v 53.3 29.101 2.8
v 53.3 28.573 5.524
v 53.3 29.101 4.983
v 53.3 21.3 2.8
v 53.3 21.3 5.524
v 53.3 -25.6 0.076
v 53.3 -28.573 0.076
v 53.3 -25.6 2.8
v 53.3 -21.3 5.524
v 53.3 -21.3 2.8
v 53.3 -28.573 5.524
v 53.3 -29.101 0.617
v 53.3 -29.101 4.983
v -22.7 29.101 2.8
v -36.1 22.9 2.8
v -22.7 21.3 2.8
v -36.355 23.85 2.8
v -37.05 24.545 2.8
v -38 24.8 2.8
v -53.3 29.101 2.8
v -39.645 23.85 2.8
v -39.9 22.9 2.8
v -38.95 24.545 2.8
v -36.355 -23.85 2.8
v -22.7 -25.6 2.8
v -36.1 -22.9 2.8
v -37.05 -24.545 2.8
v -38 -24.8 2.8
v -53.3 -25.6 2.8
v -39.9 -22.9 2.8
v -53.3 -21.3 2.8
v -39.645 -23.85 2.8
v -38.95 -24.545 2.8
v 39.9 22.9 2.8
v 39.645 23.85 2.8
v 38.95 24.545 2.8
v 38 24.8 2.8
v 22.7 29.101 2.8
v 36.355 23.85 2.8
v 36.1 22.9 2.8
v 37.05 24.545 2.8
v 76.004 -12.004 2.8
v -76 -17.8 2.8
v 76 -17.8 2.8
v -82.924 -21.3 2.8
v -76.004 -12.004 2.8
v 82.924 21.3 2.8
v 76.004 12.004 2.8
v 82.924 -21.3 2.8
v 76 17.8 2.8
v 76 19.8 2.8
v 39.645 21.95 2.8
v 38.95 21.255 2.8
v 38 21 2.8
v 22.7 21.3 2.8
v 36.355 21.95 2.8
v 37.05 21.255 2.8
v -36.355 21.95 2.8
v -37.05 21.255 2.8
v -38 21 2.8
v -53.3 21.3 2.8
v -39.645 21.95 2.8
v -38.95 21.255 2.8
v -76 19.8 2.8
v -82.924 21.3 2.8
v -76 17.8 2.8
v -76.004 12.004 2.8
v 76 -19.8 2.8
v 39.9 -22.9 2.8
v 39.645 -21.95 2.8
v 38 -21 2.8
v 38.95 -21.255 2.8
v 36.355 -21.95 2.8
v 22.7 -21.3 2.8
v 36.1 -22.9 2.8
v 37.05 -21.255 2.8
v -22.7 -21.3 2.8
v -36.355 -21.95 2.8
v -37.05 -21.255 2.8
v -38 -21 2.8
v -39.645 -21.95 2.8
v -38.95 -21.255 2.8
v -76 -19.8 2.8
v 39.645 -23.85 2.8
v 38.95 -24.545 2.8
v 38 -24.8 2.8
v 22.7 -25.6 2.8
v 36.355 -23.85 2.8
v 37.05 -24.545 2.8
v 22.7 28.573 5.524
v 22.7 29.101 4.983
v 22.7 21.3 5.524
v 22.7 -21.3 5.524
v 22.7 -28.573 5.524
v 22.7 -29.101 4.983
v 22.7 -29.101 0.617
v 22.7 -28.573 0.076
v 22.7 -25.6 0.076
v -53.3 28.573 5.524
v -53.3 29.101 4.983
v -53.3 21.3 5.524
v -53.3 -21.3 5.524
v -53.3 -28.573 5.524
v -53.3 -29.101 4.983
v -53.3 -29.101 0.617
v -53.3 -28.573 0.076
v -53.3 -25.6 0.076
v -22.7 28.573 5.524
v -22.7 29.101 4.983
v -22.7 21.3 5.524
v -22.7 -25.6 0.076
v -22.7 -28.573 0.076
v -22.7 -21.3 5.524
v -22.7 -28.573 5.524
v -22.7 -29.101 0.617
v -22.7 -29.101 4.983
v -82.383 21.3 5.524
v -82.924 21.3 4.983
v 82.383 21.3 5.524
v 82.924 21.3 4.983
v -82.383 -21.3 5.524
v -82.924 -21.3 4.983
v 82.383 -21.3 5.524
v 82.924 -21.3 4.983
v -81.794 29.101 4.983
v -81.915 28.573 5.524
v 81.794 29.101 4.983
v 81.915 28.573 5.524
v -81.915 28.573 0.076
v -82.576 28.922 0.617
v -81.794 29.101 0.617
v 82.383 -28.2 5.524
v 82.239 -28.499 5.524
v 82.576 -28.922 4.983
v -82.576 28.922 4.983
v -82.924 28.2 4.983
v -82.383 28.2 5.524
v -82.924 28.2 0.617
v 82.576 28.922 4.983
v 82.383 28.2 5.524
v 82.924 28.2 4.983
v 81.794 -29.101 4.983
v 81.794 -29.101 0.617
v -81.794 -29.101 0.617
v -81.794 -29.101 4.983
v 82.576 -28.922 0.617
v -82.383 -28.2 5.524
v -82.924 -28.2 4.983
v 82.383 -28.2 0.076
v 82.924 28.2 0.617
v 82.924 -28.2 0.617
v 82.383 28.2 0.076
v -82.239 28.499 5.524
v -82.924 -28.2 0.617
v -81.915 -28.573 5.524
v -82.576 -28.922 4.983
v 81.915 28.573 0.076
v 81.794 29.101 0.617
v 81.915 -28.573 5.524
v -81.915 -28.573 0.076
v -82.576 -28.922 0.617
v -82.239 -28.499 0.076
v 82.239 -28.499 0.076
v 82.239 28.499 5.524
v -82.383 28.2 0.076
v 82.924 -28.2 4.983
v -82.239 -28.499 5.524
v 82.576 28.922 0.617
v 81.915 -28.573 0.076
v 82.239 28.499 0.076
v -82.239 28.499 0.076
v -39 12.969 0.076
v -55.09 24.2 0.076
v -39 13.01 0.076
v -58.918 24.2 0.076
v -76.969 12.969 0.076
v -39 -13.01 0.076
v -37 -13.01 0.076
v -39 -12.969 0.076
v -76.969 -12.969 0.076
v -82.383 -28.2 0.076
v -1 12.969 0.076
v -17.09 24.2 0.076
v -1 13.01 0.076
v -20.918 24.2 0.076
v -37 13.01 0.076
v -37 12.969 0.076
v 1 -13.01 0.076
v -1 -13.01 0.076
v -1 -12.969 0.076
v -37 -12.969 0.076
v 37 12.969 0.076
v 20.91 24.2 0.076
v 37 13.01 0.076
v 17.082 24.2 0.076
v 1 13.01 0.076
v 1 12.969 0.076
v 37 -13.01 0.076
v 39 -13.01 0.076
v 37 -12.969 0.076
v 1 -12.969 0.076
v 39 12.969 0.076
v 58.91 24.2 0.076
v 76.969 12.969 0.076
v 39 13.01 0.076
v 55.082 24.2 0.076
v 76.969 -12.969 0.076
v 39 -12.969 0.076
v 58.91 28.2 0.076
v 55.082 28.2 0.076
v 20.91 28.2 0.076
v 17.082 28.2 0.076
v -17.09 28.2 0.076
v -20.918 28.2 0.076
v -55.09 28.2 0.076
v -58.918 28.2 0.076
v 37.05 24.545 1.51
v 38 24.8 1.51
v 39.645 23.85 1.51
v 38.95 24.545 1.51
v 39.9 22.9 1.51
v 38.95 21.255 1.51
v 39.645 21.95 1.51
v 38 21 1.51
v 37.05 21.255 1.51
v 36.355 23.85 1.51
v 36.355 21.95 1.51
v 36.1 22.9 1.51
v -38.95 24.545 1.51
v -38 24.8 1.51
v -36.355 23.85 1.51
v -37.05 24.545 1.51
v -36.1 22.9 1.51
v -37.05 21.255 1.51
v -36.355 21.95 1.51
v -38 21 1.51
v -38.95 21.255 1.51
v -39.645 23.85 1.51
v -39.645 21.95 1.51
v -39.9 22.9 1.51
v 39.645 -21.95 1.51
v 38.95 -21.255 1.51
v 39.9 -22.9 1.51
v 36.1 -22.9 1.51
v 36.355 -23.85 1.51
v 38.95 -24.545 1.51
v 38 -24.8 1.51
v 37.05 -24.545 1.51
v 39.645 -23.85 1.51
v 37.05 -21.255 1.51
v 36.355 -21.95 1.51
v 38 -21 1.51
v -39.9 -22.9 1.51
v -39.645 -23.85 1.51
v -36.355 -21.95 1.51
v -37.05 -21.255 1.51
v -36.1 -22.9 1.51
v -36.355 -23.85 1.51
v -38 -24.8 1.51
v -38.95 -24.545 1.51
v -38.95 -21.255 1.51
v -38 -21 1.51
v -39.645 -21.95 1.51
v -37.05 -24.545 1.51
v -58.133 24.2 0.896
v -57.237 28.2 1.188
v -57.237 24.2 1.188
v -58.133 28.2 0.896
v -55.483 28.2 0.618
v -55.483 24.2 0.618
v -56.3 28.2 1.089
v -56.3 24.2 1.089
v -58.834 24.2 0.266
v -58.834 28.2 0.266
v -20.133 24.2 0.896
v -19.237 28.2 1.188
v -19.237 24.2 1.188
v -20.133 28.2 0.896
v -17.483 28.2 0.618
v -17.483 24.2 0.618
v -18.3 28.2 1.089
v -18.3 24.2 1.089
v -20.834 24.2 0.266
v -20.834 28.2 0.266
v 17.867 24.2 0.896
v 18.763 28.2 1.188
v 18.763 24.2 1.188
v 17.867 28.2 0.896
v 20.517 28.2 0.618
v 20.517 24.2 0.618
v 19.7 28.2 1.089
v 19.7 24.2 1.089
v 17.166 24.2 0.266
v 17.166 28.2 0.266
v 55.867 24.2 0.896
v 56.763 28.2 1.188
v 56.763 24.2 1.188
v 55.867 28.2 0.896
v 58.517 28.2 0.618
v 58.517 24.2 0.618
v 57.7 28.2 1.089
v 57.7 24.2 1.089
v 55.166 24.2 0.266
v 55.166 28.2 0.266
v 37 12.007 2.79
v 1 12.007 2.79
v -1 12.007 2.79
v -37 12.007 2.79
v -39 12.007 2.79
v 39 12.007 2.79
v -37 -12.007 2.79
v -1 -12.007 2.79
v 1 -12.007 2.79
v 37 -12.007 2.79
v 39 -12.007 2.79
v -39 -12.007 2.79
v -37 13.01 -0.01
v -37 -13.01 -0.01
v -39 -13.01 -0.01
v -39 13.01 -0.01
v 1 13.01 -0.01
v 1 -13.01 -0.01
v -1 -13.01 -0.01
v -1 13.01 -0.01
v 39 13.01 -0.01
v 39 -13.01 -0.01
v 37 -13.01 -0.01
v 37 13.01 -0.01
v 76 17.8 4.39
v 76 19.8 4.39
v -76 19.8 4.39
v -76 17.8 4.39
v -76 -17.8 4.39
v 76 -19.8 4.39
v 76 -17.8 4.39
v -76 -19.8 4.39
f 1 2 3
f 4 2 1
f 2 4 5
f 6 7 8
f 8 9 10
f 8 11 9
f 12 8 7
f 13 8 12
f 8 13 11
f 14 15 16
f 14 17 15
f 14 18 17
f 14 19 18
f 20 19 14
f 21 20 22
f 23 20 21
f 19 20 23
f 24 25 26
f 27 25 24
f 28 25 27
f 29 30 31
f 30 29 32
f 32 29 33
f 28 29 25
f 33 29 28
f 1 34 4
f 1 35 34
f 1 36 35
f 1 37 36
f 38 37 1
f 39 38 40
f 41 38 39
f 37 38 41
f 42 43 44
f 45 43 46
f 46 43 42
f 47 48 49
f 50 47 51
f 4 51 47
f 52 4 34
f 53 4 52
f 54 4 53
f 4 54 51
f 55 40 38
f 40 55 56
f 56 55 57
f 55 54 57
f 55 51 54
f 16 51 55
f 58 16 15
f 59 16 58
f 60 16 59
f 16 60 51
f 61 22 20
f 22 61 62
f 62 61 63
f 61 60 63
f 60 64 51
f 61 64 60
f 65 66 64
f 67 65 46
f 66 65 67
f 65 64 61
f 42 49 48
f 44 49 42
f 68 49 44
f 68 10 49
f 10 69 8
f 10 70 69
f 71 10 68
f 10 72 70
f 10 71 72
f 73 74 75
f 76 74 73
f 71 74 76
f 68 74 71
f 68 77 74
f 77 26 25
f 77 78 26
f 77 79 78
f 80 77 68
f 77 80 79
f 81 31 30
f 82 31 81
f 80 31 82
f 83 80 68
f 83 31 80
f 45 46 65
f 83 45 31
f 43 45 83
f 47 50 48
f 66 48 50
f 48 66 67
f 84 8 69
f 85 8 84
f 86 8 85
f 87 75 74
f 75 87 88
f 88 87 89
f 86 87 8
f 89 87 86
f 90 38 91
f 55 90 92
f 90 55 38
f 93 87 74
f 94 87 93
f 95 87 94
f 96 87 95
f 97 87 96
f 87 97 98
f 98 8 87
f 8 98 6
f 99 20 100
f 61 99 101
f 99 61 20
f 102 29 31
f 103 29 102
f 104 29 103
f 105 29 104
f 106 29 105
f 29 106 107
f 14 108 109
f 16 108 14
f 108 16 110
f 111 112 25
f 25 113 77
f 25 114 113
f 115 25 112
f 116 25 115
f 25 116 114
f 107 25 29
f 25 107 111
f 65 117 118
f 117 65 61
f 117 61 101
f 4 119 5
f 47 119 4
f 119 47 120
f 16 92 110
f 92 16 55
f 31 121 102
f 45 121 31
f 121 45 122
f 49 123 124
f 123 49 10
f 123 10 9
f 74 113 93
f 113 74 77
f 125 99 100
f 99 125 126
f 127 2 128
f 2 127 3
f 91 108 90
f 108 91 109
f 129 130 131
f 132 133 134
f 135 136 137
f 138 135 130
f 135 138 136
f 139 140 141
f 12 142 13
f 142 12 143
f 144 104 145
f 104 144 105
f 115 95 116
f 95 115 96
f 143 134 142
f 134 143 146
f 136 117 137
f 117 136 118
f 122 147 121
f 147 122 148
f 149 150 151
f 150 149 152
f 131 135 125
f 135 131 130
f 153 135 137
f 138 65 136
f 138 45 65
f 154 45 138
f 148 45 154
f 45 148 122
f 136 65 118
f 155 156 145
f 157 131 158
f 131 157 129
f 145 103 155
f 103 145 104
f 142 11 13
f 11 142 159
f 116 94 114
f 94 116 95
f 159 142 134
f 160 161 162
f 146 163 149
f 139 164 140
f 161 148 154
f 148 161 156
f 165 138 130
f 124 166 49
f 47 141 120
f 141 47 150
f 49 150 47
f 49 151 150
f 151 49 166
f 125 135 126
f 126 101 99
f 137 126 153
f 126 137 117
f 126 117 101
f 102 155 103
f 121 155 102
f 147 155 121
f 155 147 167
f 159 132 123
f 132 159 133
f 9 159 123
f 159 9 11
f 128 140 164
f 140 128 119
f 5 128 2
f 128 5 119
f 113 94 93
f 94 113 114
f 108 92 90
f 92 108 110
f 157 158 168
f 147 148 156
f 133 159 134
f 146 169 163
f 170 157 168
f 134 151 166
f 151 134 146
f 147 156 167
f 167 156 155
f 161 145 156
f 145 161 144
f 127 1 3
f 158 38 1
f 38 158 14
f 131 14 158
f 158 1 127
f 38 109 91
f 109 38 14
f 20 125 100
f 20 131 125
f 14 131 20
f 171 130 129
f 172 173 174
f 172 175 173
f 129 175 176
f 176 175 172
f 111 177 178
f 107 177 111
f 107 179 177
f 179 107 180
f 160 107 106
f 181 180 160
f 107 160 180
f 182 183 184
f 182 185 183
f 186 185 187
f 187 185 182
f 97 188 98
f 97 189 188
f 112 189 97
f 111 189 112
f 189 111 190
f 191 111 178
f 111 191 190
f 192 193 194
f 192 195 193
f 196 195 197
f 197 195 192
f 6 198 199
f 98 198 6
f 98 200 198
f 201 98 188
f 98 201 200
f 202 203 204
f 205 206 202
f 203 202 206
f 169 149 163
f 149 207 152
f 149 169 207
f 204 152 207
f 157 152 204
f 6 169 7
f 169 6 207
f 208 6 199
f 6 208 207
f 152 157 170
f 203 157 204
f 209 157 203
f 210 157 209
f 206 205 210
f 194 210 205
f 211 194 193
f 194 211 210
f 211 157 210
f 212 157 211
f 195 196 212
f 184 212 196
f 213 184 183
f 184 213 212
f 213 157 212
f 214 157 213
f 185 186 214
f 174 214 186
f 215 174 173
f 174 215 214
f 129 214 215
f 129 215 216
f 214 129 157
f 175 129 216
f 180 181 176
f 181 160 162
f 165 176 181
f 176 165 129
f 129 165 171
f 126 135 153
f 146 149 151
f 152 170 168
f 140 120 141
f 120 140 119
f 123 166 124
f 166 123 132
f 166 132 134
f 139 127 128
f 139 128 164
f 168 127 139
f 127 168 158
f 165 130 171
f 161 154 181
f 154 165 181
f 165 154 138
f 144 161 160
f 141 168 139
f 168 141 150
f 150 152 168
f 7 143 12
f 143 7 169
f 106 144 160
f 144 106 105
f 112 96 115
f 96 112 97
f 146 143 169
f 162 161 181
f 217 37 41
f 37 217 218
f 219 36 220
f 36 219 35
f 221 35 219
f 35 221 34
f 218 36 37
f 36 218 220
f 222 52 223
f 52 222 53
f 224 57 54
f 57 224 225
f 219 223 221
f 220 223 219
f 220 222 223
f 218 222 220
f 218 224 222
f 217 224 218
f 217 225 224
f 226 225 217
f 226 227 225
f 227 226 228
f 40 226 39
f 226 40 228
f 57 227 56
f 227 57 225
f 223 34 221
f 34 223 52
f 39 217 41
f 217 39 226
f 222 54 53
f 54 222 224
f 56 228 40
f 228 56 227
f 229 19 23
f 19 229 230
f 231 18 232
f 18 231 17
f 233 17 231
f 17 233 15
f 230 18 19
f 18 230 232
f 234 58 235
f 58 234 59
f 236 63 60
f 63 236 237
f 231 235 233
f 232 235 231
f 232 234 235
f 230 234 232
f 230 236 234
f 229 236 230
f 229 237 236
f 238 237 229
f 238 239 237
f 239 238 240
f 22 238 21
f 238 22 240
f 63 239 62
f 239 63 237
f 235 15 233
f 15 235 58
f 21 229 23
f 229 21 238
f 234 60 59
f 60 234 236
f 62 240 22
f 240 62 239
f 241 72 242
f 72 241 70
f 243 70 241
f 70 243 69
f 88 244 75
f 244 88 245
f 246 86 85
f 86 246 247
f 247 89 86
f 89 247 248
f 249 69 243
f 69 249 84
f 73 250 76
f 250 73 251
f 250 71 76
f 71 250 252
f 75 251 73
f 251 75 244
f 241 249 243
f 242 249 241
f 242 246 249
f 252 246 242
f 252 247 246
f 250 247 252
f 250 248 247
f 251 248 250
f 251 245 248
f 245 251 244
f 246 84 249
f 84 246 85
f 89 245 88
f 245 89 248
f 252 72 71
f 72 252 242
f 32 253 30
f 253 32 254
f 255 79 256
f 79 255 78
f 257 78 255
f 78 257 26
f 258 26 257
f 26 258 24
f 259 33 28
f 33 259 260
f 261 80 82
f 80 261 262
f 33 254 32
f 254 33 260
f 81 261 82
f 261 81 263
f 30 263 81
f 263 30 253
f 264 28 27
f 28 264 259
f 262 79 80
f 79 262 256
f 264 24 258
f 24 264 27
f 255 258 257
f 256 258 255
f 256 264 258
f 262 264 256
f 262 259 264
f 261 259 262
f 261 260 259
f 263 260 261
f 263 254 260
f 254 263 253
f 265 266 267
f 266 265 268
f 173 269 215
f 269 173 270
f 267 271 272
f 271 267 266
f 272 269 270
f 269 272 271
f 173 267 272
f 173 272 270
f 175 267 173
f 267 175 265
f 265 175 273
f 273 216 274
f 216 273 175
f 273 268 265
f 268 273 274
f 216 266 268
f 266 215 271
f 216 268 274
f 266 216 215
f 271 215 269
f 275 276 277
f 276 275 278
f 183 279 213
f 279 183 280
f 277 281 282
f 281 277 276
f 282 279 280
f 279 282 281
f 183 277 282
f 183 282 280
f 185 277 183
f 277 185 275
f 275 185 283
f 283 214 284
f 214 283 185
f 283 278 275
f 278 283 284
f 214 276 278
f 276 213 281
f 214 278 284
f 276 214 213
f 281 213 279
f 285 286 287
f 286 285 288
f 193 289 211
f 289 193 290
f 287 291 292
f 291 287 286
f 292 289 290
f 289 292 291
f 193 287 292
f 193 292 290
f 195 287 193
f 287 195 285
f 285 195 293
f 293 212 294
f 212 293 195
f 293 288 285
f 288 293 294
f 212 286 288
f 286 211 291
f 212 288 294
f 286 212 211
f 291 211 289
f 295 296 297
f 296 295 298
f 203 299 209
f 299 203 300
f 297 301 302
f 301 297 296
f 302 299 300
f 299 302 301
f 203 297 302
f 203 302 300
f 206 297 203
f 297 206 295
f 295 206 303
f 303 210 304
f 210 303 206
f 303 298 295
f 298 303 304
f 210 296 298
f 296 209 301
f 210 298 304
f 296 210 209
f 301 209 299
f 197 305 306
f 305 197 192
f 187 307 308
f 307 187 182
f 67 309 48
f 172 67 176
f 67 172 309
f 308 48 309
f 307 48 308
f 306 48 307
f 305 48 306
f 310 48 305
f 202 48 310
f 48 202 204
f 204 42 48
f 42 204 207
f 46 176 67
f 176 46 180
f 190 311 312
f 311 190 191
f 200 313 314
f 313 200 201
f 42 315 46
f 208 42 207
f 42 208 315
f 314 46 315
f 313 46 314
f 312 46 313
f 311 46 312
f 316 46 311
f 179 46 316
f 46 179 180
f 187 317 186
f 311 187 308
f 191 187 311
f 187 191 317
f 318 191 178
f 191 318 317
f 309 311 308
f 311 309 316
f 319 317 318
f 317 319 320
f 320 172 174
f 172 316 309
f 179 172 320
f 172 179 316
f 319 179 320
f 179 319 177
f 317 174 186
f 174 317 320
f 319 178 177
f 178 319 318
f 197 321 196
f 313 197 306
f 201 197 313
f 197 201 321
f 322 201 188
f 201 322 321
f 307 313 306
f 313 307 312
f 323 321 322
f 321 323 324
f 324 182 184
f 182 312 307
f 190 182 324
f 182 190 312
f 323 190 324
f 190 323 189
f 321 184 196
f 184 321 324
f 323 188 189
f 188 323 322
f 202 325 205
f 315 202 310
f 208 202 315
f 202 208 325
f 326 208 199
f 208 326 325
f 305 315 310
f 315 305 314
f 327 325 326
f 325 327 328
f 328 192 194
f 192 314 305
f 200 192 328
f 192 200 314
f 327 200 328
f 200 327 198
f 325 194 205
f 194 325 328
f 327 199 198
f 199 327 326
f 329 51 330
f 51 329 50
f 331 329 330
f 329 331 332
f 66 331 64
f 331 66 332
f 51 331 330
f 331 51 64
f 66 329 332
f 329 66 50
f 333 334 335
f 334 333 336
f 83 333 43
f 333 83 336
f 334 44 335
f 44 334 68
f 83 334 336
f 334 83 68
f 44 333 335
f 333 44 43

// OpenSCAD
// -*- mode: SCAD ; c-file-style: "ellemtel" ; coding: utf-8 -*-
//
// Holder to scan Minox film strips with a Reflecta ProScan 10T
//
// © 2018 Roland Sieker <ospalh@gmail.com>
// Licence: CC-BY-SA 4.0


/* [Global] */


// … to preview. You will get both parts when you click “Create Thing”.
part = "halter"; // [halter: film holder, einsatz: film holder clamp]

// Set this to “render” and click on “Create Thing” when done with the setup.
preview = 1; // [0:render, 1:preview]

/* [Holder] */

// Width of the holder. This one and the next one are the two values you do need to set up for your scanner. Preset is for a Reflecta proScan. Maybe subtract half a millimtre for a better fit.
holder_width = 58.4;  // [20:0.1:150]

// Height or thickness of the holder. See above. You know they were too high when you need a mallet to go from one image to the next…
holder_thickness = 5.6;  // [3:0.1:10]

// How many exposures on the longest strips you want to fit into this. Make sure the resulting holder still fits onto your print bed.
images_per_strip = 4;  // [1:1:8]

/* [Magnets] */

// Diameter of the magnet hole. Add clearance by hand here. Set to 0 for no magnet holes.
magnet_diameter = 3.8;  // [0:0.1:15]
// Height or thickness of the magnet. Make sure to use magnets flat enough to fit.
magnet_height = 1;  // [0.5:0.1:3]

/* [Hidden] */

// Das ganze Filmgrößen-Geraffel wieder verstecken: ein thing pro
// Film. Teil der Automatik (mit/ohne Stege, Lang-oder Kurzkerbe) sind so
// halbwegs inaktiv.


// Width of the film
film_width = 35;  // [8:0.1:70]
// Length from the left edge of an exposure to its right edge
image_width = 36; // [8:0.1:100]
// Length from one point (e.g. left edge) of one exposure to the same point of the next exposure. This minus the image width is used for the vertical ridges, if it’s positive.
image_pitch = 8*4.75;  // 8 perf
// Size of an exposure from bottom to top.
image_height = 24; // [7:0.1:68]


bildabstand = max(image_pitch, image_width);
l_filmsteg = max(0, bildabstand-image_width);
r_r = 1.0;  // Rundungsradius

// Auch wichtig:
l_zk = 4;  // Länge Zentrierkerbe
b_zk = 4;  // Breite Zentrierkerbe
h_zk = 1.2;  // Tiefe der Zentrierkerbe
w_zk = 1;  // Wand bzw Abstand der Zentrierkerbe vom Rand



l_griff = 30;
o_griff = 30;
w_griff = 3;
magnet_y_off = 0;  // Abstand Magnet vom Einsatz

kurzsteg_grenze = 1;  // Weniger als 1 mm pro Seite: Kurzstege

mit_langsteg = ( ((film_width-image_height)/2) >= kurzsteg_grenze);


w_steg = 2;  // Breite für Stücke, die den Film zentrieren.
l_kurzsteg = 0.4*bildabstand;  // Länge für Stücke, die den Film zentrieren,
// wenn wier keine Fensterstege machen



w_schraeg = 1;  // Breite der Abschrägung rund um die Filmfenster




// *******************************************************
// Extra parameters. These can be changed reasonably safely.


w = 1.8;  // Wall width
p = 1.2;  // Bottom, top plate height
c = 0.6;  // Clearance
c_z = 0.3;  // Clearance in z direction. Mostly for the magnet hole and centering ridge
angle = 60; // Overhangs much below 60° are a problem for me


// Halbwegs wichtig
h_steg = 1.6;  // Höhe für Stücke, die den Film zentrieren.
h_nut = h_steg + c_z;  // Tiefe für Stücke, auf denen der Film nicht aufliegt



// *******************************************************
// Some shortcuts. These shouldn’t be changed

tau = 2 * PI;  // π is still wrong. τ = ⌀ ÷ r

xy_factor = 1/tan(angle);
// To get from a height to a horizontal width inclined correctly
z_factor = tan(angle);  // The other way around

some_distance = 1.2 * holder_width;
ms = 0.01;  // Muggeseggele.

// fn for differently sized objects and fs, fa; all for preview or rendering.
pna = 40;
pnb = 15;
pa = 5;
ps = 1;
rna = 180;
rnb = 30;
ra = 1;
rs = 0.1;
function na() = (preview) ? pna : rna;
function nb() = (preview) ? pnb : rnb;
$fs = (preview) ? ps : rs;
$fa = (preview) ? pa : ra;

l_fenster = bildabstand * images_per_strip;
l_rand = 2 * w_steg + w_schraeg + 2;
w_rand = w_schraeg + 8;
l_ue_a =  l_fenster + 2*l_rand;
w_einsatz = image_height + 2 * w_rand;
h_bd = holder_thickness/2;  // Höhe Boden oder Deckel

to_griff = l_ue_a/2 - o_griff - l_griff/2;



// *******************************************************
// End setup




// *******************************************************
// Generate the parts


print_part();
// filmhalter();
// einsatz();
// preview_parts();
// stack_parts();



module print_part()
{
   if ("halter" == part)
   {
      filmhalter();
   }
   if ("einsatz" == part)
   {
      einsatz();
   }
}

module preview_parts()
{
   filmhalter();
   translate([0, some_distance, 0])
   {
      einsatz();
   }
}

module stack_parts()
{
   // intersection()
   {
       // color("yellow")
      {
         filmhalter();
      }
      translate([0,0,holder_thickness + ms])
      {
         rotate([0,180,0])
         {
            // color("red")
            {
               einsatz();
            }
         }
      }
   }
}

// *******************************************************
// Code for the parts themselves


module filmhalter()
{
   difference()
   {
      basis_filmhalter();
      fenster();
      magnetausschnitte();
      kerben();
   }
   fensterstege();
   bodenstege();
}

module einsatz()
{
   difference()
   {
      union()
      {
         difference()
         {
            basis_einsatz();
            fenster();
         }
         fensterstege();
      }
      einsatzausschnitte();
      // magnetausschnitte(magnet_diameter/2);
      magnetausschnitte();
   }

}


module basis_filmhalter()
{
   translate([0,0,h_bd])
   {
      difference()
      {
         massiver_halter();
         einsatz_ausschnitt(c);
      }
   }
}


module basis_einsatz()
{
   translate([0,0,h_bd])
   {
      intersection()
      {
         massiver_halter();
         rotate([0,180,0])
         {
            einsatz_ausschnitt(0);
         }
      }
   }

}

module massiver_halter()
{
   hull()
   {
      vosp();
      mirror([0,0,1])
      {
         vosp();
      }
   }

   module vosp()
   {
      tosp();
      mirror([0,1,0])
      {
         tosp();
      }
   }
   module tosp()
   {
      osp();
      mirror([1,0,0])
      {
         osp();
      }

   }

   module osp()
   {
      translate([l_ue_a/2-r_r, holder_width/2-r_r, holder_thickness/2-r_r])
      {
         sphere(r=r_r);
      }
   }
}


module einsatz_ausschnitt(ec)
{
   translate([0, 0, holder_thickness])
   {
      cube([l_ue_a+2*ms, w_einsatz + ec, 2*holder_thickness], center=true);
      grip_cut();
      mirror()
      {
         grip_cut();
      }
   }
   module grip_cut()
   {
      translate([to_griff, 0, 0])
      {
         cube([l_griff + ec, holder_width + 2*ms, 2*holder_thickness], center=true);
         translate([0, -holder_width/2, 0])
         {
            cube([l_griff + ec, 2*w_griff+2*ec, 4*holder_thickness], center=true);
         }
      }
   }
}

module fenster()
{
   translate([0, 0, h_bd])
   {
      hull()
      {
         translate([0,0,-0.5+ms])
         {
            cube([l_fenster, image_height, 1], center=true);
         }
         translate([0,0,-h_bd-0.5-ms])
         {
            cube(
               [l_fenster+2*w_schraeg, image_height+2*w_schraeg, 1], center=true);
         }
      }

   }
}


module magnetausschnitte()
{
   if (magnet_diameter > 0 && magnet_height > 0)
   {
      magnetausschnitt(1, 1);
      magnetausschnitt(-1, 1);
      magnetausschnitt(1, -1);
      magnetausschnitt(-1, -1);
   }
}

module magnetausschnitt(xf, yf)
{
   yo_mag = w_einsatz/2 + magnet_diameter/2 +magnet_y_off;


   // Mittig in den Griffen.
   translate(
      [xf * (to_griff), yf * (yo_mag), h_bd - magnet_height-c_z + ms])
   {
      cylinder(d=magnet_diameter, h=magnet_height+c_z);  // N.B. Spiel ist schon im magnet_diameter
      // eingerechnet
   }
}

module bodenstege()
{
   translate([0, 0, -ms+h_steg/2+h_bd])
   {
      if (mit_langsteg)
      {
         langbodensteg();
         rotate(180)
         {
            langbodensteg();
         }
      }
      else
      {
         kurzbodenstege();
         rotate(180)
         {
            kurzbodenstege();
         }
      }
   }
   module langbodensteg()
   {
      translate([0,w_steg/2+film_width/2+c/2, 0])
      {
         cube([l_fenster, w_steg, h_steg], center=true);
      }
   }
   module kurzbodenstege()
   {
      for (i=[0:images_per_strip-1])
      {
         translate([-l_fenster/2 + (0.5 + i) * bildabstand, w_steg/2+film_width/2+c/2, 0])
         {
            cube([l_kurzsteg, w_steg, h_steg], center=true);
         }
      }
   }
}

module einsatzausschnitte()
{
   translate([0, 0, h_bd + ms-h_nut/2])
   {
      if (mit_langsteg)
      {
         langausschnitt();
         rotate(180)
         {
            langausschnitt();
         }
      }
      else
      {
         kurzausschnitte();
         rotate(180)
         {
            kurzausschnitte();
         }
      }
   }
   module langausschnitt()
   {
      translate([0,w_steg/2+film_width/2+c/2,0])
      {
         cube([l_fenster+6*c, w_steg+2*c, h_nut], center=true);
      }
   }
   module kurzausschnitte()
   {
      for (i=[0:images_per_strip-1])
      {
         translate([-l_fenster/2 + (0.5 + i) * bildabstand, w_steg/2+film_width/2+c/2-film_width/4 + image_height/4, 0])
         {
            cube([l_kurzsteg+2*c, w_steg+2*c+film_width/2 - image_height/2, h_nut], center=true);
         }
      }
   }
}


module fensterstege()
{
   if (l_filmsteg > 0)
   {
      for (i=[1:images_per_strip-1])
      {
         translate([-l_fenster/2 + i * bildabstand, 0, h_bd/2-ms])
         {
            cube([l_filmsteg, image_height+2*w_schraeg + 2*ms ,h_bd], center=true);
         }
      }
   }
}

module kerben()
{
   // Den Radius der Zentrierkerbe kann mensch per Pythagoras bestimmen.
   // Hypothenuse = r_zk
   // 1. Kathete = l_zk/2
   // 2. Kathete = r_zk - h_zk
   // h_zk > 0
   // r_zk * r_zk = l_zk * l_zk / 4 + r_zk * r_zk - 2 * r_zk * h_zk + h_zk * h_zk
   // 0 = l_zk * l_zk / 4 - 2 * r_zk * h_zk + h_zk * h_zk
   // 2 * r_zk * h_zk =
   r_zk = (l_zk * l_zk / 4 + h_zk * h_zk) / (2 * h_zk);
   for (i=[0:images_per_strip-1])
   {
      translate(
         [-l_fenster/2 + i * bildabstand + bildabstand/2, holder_width/2 - w_zk, h_zk-r_zk])
      {
         rotate([90,0,0])
         {
            cylinder(r=r_zk, h=b_zk);
         }
      }
   }

}
